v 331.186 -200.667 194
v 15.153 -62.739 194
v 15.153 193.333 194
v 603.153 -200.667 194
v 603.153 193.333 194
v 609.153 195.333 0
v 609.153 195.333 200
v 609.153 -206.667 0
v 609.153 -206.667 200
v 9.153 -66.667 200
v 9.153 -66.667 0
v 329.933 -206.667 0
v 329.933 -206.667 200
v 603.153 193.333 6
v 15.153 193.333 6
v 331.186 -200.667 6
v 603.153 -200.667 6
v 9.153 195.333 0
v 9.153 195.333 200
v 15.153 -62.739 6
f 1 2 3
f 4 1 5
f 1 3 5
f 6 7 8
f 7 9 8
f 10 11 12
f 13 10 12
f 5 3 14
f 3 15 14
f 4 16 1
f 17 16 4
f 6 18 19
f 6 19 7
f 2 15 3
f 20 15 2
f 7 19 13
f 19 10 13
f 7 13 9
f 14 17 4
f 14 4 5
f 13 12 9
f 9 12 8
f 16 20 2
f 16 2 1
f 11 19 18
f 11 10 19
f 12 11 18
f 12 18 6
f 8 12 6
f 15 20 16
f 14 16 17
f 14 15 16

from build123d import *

# Parameters (mm, degrees)
BOSS_EXTRUDE1_DEPTH = 200
SHELL1_T            = -6
SKETCH4_W           = 600
SKETCH4_H           = 200
BOSS_EXTRUDE2_DEPTH = 2


with BuildPart() as part:
    # Sketch3 → Boss-Extrude1 (new body)
    with BuildSketch(Plane.XY):
        Polygon((9.153032832, -66.666666667), (329.933331479, -206.666666667), (609.153032832, -206.666666667), (609.153032832, 193.333333333), (9.153032832, 193.333333333), align=None)
    extrude(amount=BOSS_EXTRUDE1_DEPTH)

    # Shell1
    shell1_openings = [part.faces().sort_by_distance(p)[0] for p in [
        (309.153032832, 193.333333333, 100),
    ]]
    offset(amount=SHELL1_T, openings=shell1_openings, kind=Kind.INTERSECTION)

    # Sketch4 → Boss-Extrude2 (add)
    with BuildSketch(Plane(origin=(0, 193.333333333, 0), x_dir=(1, 0, 0), z_dir=(0, 1, 0))):
        with Locations((309.153032832, -100)):
            Rectangle(SKETCH4_W, SKETCH4_H)
    extrude(amount=BOSS_EXTRUDE2_DEPTH)


solid = part.part
